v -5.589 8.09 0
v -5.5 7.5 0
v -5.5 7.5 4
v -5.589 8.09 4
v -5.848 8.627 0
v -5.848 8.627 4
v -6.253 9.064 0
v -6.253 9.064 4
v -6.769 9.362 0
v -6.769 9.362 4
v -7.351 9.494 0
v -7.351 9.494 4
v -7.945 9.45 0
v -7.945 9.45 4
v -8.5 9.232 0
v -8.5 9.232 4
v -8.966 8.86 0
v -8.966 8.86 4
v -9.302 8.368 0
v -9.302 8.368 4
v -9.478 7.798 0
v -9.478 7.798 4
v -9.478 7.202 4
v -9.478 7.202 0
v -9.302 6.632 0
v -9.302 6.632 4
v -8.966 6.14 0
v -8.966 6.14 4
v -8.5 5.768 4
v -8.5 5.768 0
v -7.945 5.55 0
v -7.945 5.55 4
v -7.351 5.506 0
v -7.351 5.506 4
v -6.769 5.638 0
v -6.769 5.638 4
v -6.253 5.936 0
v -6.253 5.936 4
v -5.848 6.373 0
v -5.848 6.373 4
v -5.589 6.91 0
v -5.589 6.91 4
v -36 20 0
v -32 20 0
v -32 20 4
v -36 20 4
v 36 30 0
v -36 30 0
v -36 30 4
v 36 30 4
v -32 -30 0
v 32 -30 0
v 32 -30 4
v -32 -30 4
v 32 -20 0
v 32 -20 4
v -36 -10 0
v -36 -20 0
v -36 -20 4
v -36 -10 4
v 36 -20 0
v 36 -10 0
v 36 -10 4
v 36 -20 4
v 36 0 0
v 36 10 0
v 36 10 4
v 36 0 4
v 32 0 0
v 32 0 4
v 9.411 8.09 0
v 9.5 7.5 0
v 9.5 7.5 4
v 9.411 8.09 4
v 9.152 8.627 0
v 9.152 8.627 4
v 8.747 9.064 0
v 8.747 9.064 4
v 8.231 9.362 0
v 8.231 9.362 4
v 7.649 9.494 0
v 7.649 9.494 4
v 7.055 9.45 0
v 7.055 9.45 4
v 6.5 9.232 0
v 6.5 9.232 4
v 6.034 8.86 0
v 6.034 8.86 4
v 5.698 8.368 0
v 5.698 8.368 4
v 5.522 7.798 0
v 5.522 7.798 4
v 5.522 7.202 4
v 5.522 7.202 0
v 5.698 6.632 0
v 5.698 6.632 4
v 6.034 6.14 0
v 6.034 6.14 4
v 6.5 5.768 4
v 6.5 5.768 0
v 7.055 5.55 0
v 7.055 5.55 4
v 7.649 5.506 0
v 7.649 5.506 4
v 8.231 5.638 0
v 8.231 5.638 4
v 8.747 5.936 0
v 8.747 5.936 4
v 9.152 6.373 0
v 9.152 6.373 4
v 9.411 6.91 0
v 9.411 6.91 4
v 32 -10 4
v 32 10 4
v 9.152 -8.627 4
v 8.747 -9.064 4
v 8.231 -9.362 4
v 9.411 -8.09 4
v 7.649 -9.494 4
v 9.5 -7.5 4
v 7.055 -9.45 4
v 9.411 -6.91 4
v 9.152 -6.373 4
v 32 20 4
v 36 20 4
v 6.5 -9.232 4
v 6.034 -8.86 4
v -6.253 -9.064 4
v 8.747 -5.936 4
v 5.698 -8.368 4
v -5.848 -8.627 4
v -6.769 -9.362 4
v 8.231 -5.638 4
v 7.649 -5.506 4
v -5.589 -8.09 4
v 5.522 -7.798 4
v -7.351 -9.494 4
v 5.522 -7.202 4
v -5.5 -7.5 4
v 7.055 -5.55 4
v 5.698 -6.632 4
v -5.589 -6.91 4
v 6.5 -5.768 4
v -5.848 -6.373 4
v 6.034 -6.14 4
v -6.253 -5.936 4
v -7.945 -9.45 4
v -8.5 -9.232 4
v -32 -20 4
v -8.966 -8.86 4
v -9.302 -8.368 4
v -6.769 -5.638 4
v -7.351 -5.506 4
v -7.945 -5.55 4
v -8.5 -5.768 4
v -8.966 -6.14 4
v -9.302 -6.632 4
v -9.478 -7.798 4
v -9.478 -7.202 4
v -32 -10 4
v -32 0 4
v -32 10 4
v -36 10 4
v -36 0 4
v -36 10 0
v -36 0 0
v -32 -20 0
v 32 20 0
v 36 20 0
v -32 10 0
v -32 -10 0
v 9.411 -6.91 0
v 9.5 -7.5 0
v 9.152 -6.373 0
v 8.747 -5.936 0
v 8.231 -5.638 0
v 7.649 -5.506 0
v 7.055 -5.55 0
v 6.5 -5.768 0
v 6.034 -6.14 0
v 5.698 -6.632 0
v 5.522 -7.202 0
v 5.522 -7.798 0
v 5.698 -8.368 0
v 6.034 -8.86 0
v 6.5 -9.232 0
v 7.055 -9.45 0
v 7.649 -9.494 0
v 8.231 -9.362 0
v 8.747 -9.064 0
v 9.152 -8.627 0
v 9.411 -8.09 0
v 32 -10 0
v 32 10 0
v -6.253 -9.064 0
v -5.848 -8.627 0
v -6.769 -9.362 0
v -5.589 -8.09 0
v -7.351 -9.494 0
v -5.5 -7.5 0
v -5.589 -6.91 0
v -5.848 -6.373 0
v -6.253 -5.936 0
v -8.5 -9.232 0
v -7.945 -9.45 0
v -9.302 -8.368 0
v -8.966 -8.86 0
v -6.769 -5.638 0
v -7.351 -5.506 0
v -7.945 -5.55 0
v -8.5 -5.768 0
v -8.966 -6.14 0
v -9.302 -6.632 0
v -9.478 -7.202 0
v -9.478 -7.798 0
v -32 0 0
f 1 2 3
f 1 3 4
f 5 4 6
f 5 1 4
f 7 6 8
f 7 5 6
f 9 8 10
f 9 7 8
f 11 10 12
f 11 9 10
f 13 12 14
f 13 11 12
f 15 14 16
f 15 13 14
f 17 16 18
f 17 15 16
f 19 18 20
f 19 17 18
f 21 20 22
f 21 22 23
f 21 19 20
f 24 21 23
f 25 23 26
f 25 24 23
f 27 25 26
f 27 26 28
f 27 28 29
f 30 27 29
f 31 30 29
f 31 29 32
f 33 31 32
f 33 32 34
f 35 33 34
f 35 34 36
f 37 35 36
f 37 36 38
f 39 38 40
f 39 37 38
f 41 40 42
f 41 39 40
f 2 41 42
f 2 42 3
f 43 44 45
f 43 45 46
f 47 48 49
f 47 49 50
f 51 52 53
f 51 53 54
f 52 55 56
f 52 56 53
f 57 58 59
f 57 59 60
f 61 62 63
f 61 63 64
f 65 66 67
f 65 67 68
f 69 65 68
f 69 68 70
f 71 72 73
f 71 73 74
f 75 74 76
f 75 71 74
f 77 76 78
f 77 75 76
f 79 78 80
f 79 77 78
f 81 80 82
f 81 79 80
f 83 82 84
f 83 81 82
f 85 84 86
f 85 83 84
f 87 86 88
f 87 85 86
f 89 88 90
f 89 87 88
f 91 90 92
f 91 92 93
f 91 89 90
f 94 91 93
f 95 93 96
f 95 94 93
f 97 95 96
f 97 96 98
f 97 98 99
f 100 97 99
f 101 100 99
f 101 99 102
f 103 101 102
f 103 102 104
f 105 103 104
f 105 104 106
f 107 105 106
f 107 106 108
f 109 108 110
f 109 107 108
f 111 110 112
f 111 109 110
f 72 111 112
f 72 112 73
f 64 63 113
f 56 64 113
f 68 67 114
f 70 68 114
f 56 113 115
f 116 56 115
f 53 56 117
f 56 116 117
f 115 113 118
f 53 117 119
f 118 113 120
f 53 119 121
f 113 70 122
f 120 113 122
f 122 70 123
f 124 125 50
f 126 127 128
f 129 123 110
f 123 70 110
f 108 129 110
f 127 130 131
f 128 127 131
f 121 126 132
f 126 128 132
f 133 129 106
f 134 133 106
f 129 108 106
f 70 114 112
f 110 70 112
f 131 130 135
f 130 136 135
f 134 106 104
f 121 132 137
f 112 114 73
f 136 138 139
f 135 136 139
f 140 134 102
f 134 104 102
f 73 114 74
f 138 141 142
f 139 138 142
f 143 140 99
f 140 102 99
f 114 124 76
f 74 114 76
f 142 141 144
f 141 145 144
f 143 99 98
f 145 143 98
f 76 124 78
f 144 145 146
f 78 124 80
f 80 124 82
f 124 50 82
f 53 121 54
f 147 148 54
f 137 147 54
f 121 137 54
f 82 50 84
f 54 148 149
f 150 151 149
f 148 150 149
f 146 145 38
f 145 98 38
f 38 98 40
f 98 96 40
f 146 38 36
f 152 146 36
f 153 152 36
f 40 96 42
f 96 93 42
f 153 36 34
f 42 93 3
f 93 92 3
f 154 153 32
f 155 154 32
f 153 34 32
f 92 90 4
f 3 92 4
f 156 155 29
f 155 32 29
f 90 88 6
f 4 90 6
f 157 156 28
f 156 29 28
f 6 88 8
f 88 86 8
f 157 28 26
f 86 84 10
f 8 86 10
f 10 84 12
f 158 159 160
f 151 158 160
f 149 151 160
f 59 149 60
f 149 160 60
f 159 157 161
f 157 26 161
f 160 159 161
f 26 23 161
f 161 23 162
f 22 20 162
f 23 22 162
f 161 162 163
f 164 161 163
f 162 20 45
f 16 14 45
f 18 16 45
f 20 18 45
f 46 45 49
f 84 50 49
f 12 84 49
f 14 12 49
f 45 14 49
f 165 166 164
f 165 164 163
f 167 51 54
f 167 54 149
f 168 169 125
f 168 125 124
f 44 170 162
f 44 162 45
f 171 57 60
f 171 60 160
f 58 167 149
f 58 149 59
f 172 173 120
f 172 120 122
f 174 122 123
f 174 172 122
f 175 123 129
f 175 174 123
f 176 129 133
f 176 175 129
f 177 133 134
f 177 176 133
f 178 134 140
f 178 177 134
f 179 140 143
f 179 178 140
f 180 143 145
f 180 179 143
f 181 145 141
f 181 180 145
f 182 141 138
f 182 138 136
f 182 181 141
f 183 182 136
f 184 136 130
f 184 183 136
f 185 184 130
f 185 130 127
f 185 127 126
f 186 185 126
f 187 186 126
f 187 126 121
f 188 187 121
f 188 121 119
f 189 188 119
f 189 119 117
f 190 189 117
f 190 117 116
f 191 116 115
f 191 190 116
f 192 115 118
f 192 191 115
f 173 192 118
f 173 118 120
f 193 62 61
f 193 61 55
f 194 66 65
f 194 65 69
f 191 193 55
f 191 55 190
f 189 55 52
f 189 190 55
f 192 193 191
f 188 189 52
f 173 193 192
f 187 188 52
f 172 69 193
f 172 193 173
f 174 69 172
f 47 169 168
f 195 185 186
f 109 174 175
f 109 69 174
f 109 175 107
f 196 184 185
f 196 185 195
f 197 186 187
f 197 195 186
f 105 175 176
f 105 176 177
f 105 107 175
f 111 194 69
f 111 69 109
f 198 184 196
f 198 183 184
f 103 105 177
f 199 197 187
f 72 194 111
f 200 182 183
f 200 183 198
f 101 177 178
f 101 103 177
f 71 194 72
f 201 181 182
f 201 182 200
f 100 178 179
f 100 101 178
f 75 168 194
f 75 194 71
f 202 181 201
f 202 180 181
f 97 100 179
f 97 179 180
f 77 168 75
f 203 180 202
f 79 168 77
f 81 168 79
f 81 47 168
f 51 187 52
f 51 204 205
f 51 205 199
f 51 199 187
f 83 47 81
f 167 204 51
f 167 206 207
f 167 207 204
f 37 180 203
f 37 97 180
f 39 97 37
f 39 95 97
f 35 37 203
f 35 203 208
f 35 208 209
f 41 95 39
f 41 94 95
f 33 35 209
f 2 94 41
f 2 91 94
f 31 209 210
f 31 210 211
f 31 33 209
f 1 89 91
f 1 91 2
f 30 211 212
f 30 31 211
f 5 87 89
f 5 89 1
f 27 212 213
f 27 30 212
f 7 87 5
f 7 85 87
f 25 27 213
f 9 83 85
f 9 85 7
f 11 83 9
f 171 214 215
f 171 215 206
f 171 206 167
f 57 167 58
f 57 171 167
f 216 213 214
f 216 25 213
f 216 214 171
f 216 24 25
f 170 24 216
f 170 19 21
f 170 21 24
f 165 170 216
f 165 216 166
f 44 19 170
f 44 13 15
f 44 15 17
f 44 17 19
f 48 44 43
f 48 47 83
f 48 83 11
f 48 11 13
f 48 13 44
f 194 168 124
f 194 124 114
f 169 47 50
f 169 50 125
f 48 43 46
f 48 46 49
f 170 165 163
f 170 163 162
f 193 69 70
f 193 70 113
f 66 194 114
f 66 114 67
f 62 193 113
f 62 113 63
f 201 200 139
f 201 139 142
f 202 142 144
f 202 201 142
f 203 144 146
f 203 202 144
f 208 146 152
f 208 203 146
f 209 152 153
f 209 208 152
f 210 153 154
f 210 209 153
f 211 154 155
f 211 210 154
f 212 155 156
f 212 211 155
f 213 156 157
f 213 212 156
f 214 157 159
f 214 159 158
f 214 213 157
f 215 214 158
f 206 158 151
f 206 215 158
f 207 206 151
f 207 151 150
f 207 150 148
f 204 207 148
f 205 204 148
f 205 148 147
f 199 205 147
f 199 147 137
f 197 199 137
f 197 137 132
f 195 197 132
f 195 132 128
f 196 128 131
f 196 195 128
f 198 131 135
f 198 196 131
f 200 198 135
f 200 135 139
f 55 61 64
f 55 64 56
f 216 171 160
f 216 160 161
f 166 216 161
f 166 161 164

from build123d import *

# Parameters (mm, degrees)
SKETCH1_R           = 2
BOSS_EXTRUDE1_DEPTH = 4


with BuildPart() as part:
    # Sketch1 → Boss-Extrude1 (new body)
    with BuildSketch(Plane.XY):
        Polygon((36, 20), (32, 20), (32, 10), (36, 10), (36, 0), (32, 0), (32, -10), (36, -10), (36, -20), (32, -20), (32, -30), (-32, -30), (-32, -20), (-36, -20), (-36, -10), (-32, -10), (-32, 0), (-36, 0), (-36, 10), (-32, 10), (-32, 20), (-36, 20), (-36, 30), (36, 30), align=None)
        with Locations((-7.5, 7.5)):
            Circle(SKETCH1_R, mode=Mode.SUBTRACT)
        with Locations((-7.5, -7.5)):
            Circle(SKETCH1_R, mode=Mode.SUBTRACT)
        with Locations((7.5, -7.5)):
            Circle(SKETCH1_R, mode=Mode.SUBTRACT)
        with Locations((7.5, 7.5)):
            Circle(SKETCH1_R, mode=Mode.SUBTRACT)
    extrude(amount=BOSS_EXTRUDE1_DEPTH)


solid = part.part
